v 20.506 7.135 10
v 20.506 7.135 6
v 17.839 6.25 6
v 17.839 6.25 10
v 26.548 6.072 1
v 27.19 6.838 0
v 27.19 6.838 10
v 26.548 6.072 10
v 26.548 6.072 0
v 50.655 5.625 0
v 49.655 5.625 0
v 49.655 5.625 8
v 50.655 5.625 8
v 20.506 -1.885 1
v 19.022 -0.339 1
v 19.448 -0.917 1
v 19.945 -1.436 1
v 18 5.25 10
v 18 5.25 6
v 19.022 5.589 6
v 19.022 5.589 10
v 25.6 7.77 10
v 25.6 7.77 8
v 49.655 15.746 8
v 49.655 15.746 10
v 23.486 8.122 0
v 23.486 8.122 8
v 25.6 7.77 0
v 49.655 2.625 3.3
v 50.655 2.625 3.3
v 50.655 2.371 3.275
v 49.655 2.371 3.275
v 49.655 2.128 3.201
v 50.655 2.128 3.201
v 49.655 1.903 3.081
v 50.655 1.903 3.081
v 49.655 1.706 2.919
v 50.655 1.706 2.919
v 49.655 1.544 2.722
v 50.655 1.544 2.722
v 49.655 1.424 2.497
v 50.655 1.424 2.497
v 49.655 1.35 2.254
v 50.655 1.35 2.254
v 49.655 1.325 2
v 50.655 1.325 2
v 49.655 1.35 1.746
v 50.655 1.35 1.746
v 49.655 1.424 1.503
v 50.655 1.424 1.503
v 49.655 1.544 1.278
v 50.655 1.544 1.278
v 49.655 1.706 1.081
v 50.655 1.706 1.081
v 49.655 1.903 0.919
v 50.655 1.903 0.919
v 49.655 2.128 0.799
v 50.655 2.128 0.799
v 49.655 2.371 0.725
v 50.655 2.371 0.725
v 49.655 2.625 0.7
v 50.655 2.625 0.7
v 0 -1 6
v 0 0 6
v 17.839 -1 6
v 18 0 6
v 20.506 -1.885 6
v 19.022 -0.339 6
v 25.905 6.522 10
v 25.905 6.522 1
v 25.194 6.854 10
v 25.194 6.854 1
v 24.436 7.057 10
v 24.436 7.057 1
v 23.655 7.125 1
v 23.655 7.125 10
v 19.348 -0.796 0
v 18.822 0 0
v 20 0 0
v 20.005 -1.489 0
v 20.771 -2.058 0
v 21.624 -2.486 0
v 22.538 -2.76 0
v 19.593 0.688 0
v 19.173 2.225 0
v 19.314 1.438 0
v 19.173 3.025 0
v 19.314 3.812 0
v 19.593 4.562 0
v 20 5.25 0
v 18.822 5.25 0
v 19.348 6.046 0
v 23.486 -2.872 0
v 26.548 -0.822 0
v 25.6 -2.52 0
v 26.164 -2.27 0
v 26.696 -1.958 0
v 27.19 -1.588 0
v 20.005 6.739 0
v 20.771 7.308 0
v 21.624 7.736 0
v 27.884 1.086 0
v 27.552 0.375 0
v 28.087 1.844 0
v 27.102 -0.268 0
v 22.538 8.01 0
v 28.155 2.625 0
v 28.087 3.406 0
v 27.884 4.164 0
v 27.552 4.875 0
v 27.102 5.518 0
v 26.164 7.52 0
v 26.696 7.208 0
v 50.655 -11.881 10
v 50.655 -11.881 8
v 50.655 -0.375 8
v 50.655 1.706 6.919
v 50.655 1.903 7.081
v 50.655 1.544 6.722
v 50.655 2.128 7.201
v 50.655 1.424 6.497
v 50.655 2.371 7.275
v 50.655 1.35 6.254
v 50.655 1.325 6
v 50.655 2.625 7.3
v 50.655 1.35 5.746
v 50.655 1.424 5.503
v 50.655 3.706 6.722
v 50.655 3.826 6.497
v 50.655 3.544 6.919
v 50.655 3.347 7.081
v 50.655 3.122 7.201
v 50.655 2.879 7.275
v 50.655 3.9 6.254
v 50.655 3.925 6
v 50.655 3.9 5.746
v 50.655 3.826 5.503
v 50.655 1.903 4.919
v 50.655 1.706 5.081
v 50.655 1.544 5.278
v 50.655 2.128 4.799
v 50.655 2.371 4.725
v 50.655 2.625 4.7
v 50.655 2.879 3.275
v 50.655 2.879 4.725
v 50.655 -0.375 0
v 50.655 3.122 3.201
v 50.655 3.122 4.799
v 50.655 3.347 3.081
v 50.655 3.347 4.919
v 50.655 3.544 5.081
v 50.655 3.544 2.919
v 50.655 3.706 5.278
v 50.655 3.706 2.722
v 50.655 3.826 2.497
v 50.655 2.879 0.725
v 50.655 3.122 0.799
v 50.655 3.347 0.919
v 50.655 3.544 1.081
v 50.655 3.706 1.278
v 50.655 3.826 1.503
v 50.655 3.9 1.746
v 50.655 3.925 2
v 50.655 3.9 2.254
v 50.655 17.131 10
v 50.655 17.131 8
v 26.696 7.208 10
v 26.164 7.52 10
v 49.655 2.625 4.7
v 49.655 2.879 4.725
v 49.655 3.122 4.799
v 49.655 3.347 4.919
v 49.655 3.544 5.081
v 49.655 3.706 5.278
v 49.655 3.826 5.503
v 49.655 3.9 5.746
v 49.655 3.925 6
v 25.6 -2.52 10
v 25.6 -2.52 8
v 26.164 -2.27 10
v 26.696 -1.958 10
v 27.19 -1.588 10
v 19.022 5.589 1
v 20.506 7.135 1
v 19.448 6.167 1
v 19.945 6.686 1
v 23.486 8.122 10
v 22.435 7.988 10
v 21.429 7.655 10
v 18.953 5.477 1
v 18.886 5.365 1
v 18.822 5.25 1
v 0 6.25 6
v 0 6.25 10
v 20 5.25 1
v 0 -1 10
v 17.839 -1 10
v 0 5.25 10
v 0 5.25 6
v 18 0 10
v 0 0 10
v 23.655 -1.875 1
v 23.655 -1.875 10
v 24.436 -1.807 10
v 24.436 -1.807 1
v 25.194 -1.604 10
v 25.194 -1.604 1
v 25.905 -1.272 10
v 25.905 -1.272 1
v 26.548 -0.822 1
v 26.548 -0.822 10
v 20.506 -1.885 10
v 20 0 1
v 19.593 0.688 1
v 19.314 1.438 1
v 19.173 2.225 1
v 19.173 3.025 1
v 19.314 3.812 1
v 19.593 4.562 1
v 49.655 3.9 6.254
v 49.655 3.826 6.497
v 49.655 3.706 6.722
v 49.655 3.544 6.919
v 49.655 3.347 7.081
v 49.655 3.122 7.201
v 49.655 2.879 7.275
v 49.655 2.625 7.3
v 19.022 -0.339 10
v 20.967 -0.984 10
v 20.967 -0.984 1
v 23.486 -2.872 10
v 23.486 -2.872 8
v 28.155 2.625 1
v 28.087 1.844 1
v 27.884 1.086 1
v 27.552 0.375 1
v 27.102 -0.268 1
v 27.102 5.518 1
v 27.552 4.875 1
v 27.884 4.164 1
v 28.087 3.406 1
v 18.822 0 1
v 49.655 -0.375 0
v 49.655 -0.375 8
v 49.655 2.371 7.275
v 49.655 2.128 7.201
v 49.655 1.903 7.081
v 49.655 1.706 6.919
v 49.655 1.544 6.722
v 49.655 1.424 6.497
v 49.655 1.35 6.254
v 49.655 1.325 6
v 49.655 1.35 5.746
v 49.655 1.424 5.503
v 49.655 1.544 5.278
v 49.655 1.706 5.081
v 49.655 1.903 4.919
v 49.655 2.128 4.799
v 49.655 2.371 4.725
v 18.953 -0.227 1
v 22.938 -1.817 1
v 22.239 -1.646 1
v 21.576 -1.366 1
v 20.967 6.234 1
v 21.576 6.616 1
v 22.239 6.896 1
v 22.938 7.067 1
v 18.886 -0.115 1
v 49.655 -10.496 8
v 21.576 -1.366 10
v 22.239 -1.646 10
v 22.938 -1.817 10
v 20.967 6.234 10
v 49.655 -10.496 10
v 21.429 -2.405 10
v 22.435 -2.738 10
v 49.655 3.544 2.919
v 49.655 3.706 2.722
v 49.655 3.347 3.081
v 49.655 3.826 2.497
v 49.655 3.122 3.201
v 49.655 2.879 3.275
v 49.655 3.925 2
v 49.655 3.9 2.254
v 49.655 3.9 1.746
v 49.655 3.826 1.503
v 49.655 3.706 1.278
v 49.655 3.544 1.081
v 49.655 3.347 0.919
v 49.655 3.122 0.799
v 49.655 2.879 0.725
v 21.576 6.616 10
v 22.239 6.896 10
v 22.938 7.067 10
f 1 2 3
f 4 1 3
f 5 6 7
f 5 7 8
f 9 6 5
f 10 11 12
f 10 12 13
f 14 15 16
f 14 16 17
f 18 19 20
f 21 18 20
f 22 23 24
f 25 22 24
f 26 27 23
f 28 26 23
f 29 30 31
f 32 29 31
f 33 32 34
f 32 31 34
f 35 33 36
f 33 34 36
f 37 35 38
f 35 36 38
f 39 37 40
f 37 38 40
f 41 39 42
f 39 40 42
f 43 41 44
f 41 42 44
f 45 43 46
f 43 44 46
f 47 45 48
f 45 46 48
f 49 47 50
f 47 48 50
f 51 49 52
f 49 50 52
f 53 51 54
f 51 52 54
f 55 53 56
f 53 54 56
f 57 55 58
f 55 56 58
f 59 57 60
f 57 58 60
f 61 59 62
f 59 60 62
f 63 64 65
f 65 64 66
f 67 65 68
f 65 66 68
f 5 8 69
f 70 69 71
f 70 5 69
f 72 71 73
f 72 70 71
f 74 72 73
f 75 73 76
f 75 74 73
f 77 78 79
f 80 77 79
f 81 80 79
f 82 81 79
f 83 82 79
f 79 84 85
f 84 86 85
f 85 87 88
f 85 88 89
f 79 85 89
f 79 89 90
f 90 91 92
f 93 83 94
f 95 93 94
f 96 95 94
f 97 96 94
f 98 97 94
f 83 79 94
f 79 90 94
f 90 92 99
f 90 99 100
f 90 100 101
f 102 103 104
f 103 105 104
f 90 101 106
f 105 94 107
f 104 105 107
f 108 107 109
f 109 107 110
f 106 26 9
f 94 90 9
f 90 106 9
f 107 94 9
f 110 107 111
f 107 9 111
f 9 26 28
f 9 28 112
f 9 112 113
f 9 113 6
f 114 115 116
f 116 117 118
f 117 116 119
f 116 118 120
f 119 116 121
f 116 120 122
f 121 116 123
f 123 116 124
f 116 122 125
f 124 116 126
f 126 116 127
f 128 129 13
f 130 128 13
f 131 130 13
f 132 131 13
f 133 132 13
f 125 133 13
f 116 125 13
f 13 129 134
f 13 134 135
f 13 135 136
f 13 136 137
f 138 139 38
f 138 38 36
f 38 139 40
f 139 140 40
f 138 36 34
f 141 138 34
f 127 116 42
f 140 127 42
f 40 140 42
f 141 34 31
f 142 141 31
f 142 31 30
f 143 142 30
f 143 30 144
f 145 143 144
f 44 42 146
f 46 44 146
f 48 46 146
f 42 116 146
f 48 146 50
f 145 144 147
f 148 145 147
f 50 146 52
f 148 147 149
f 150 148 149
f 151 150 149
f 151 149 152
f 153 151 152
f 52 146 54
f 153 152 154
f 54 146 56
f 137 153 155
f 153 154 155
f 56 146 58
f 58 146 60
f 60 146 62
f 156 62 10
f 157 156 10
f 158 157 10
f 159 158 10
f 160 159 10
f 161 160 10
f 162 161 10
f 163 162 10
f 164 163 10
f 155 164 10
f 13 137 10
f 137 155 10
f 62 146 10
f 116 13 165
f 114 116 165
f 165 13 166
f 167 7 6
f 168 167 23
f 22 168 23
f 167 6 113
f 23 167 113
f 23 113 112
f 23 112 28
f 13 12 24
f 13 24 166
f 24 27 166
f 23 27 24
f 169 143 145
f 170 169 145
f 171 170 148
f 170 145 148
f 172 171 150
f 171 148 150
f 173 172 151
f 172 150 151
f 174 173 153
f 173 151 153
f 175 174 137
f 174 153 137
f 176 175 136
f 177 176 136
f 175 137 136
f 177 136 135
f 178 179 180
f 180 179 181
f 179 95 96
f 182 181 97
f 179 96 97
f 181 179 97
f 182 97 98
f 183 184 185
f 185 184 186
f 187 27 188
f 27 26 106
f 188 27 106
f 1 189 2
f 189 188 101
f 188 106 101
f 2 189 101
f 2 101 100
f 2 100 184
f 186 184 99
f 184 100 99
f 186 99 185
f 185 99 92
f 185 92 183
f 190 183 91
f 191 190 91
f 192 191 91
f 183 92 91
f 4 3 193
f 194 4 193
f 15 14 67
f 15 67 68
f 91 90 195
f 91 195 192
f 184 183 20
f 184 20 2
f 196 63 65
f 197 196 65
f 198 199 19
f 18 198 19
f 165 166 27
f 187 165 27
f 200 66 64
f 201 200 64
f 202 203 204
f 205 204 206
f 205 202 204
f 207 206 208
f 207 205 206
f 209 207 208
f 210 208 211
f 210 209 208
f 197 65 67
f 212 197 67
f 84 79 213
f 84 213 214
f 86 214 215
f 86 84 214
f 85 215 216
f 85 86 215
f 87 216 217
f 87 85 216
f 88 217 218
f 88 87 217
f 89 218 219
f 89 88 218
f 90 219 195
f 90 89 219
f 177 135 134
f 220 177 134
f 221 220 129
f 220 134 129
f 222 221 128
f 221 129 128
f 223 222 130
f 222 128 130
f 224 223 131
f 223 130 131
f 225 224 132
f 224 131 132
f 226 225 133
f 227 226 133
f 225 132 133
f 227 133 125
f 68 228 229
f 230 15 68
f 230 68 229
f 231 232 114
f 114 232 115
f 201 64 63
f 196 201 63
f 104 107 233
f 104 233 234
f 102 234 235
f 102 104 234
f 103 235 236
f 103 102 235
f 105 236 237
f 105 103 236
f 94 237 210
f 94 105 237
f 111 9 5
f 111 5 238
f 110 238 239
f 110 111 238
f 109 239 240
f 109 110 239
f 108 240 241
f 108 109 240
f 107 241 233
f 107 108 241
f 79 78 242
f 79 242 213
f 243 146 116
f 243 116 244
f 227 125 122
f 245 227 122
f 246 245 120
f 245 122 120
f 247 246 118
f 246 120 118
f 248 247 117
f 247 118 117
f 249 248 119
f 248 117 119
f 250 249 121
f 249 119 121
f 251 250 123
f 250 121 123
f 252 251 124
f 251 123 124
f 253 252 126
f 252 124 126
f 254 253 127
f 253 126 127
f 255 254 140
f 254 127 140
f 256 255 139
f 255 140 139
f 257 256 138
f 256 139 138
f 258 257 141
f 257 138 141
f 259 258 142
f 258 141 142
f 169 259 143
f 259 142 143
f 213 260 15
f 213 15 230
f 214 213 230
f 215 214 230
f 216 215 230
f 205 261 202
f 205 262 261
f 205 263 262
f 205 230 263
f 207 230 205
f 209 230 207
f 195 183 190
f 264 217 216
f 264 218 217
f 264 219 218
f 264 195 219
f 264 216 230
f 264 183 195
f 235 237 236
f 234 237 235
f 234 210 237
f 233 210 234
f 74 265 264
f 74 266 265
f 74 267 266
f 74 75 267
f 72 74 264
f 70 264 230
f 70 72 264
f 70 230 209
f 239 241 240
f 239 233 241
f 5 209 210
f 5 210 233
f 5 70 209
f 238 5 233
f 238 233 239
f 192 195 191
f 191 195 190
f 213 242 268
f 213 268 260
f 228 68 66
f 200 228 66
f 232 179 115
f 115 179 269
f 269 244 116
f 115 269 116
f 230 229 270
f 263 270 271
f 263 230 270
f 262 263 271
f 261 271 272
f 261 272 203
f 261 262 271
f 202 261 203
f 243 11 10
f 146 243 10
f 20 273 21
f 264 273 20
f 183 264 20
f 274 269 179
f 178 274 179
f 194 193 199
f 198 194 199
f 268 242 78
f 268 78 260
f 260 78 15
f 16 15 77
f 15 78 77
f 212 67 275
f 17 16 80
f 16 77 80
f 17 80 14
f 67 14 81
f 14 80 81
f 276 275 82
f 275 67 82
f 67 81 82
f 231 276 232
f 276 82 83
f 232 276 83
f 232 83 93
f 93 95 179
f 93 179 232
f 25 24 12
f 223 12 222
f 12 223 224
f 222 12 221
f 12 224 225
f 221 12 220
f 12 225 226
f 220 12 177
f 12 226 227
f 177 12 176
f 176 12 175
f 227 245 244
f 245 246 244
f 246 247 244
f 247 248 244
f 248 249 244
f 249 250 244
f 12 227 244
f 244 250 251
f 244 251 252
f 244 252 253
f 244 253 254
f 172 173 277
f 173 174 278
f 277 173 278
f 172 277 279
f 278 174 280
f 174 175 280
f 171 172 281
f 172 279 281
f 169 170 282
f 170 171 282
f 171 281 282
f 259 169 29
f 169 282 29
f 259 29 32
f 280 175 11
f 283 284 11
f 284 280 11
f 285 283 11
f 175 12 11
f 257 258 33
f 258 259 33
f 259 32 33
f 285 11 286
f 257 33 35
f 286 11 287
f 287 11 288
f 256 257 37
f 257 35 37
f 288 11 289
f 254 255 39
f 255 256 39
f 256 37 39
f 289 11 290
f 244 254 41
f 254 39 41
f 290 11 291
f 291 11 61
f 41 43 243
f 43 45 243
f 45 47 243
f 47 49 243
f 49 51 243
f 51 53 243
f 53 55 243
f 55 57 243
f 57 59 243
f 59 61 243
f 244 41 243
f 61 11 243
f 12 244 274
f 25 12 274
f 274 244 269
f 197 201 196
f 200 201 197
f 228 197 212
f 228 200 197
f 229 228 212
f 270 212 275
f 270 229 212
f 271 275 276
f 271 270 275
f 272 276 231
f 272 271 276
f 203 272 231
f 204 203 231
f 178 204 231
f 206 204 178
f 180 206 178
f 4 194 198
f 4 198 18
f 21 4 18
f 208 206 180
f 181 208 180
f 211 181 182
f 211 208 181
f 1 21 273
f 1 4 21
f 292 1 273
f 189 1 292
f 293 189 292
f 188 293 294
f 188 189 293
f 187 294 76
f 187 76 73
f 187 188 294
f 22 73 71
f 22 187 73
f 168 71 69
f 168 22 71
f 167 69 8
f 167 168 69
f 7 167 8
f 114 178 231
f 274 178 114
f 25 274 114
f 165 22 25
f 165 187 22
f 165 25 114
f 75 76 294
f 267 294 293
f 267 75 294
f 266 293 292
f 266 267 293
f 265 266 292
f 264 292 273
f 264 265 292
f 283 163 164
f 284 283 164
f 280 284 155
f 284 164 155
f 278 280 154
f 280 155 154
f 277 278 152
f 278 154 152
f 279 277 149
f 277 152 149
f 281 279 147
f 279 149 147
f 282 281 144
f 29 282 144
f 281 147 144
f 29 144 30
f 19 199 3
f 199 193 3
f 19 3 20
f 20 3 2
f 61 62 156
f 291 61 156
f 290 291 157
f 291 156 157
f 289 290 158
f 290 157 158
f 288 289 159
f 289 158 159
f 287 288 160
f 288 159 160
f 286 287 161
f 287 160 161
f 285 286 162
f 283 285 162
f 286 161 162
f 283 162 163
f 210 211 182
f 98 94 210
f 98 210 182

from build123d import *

# Parameters (mm, degrees)
F1_R      = 5.5
F2_DEPTH  = 10
F3_DEPTH  = 10
F5_DEPTH  = 10
F6_DEPTH  = 6
F7_DEPTH  = 10
F8_DEPTH  = 1
F9_DEPTH  = 1
F10_W     = 1
F10_H     = 3
F11_DEPTH = 10
F12_DEPTH = 8
F14_DEPTH = 1


with BuildPart() as f2:
    # F1 (on Top) → F2 (new body)
    with BuildSketch(Plane.XY):
        with Locations((23.6550478793, 2.625)):
            Circle(F1_R)
    extrude(amount=F2_DEPTH)

    # F0 (on Top) → F3 (cut)
    with BuildSketch(Plane.XY):
        with BuildLine():
            ThreePointArc((28.1550478793, 2.625), (27.733432921, 0.7232178222), (26.5475921229, -0.822199994))
            Line((26.5475921229, -0.822199994), (28.8864416499, -3.6095323204))
            Line((28.8864416499, -3.6095323204), (49.6550478793, -10.4956166668))
            Line((49.6550478793, -10.4956166668), (49.6550478793, 2.625))
            Line((49.6550478793, 2.625), (28.1550478793, 2.625))
        make_face()
        with BuildLine():
            Line((28.8864416499, 8.8595323204), (26.5475921229, 6.072199994))
            ThreePointArc((26.5475921229, 6.072199994), (27.733432921, 4.5267821778), (28.1550478793, 2.625))
            Line((28.1550478793, 2.625), (49.6550478793, 2.625))
            Line((49.6550478793, 2.625), (49.6550478793, 15.7456166668))
            Line((49.6550478793, 15.7456166668), (28.8864416499, 8.8595323204))
        make_face()
        with BuildLine():
            Line((23.6550478793, 2.625), (23.6550478793, -1.875))
            ThreePointArc((23.6550478793, -1.875), (25.1941385243, -1.6036167935), (26.5475921229, -0.822199994))
            Line((26.5475921229, -0.822199994), (23.6550478793, 2.625))
        make_face()
        with BuildLine():
            ThreePointArc((20, 5.25), (19.1550478793, 2.625), (20, 0))
            ThreePointArc((20, 0), (20.4453712418, -0.5290411987), (20.9665447643, -0.9835940476))
            Line((20.9665447643, -0.9835940476), (23.6550478793, -1.875))
            Line((23.6550478793, -1.875), (23.6550478793, 2.625))
            Line((23.6550478793, 2.625), (23.6550478793, 7.125))
            Line((23.6550478793, 7.125), (20.9665447643, 6.2335940476))
            ThreePointArc((20.9665447643, 6.2335940476), (20.4453712418, 5.7790411987), (20, 5.25))
        make_face()
        with BuildLine():
            ThreePointArc((26.5475921229, 6.072199994), (25.1941385243, 6.8536167935), (23.6550478793, 7.125))
            Line((23.6550478793, 7.125), (23.6550478793, 2.625))
            Line((23.6550478793, 2.625), (26.5475921229, 6.072199994))
        make_face()
        with BuildLine():
            Line((26.5475921229, 6.072199994), (23.6550478793, 2.625))
            Line((23.6550478793, 2.625), (28.1550478793, 2.625))
            ThreePointArc((28.1550478793, 2.625), (27.733432921, 4.5267821778), (26.5475921229, 6.072199994))
        make_face()
        with BuildLine():
            Line((23.6550478793, 2.625), (26.5475921229, -0.822199994))
            ThreePointArc((26.5475921229, -0.822199994), (27.733432921, 0.7232178222), (28.1550478793, 2.625))
            Line((28.1550478793, 2.625), (23.6550478793, 2.625))
        make_face()
        with BuildLine():
            Line((23.6550478793, -1.875), (20.9665447643, -0.9835940476))
            ThreePointArc((20.9665447643, -0.9835940476), (22.2388334206, -1.6463389712), (23.6550478793, -1.875))
        make_face()
        with BuildLine():
            ThreePointArc((23.6550478793, 7.125), (22.2388334206, 6.8963389712), (20.9665447643, 6.2335940476))
            Line((20.9665447643, 6.2335940476), (23.6550478793, 7.125))
        make_face()
    extrude(amount=F3_DEPTH, mode=Mode.SUBTRACT)

    # F4 (on Top) → F5 (join)
    with BuildSketch(Plane.XY):
        Polygon((0, 5.25), (18, 5.25), (19.0219422369, 5.5888373954), (20.506438149, 7.1345739007), (17.8385406763, 6.25), (0, 6.25), align=None)
        Polygon((19.0219422369, -0.3388373954), (18, 0), (0, 0), (0, -1), (17.8385406763, -1), (20.506438149, -1.8845739007), align=None)
    extrude(amount=F5_DEPTH)

    # F4 (on Top) → F6 (cut)
    with BuildSketch(Plane.XY):
        Polygon((0, 5.25), (18, 5.25), (19.0219422369, 5.5888373954), (20.506438149, 7.1345739007), (17.8385406763, 6.25), (0, 6.25), align=None)
        Polygon((19.0219422369, -0.3388373954), (18, 0), (0, 0), (0, -1), (17.8385406763, -1), (20.506438149, -1.8845739007), align=None)
    extrude(amount=F6_DEPTH, mode=Mode.SUBTRACT)

    # F0 (on Top) → F7 (cut)
    with BuildSketch(Plane.XY):
        with BuildLine():
            Line((0, 5.25), (0, 0))
            Line((0, 0), (18, 0))
            Line((18, 0), (20, 0))
            ThreePointArc((20, 0), (19.1550478793, 2.625), (20, 5.25))
            Line((20, 5.25), (18, 5.25))
            Line((18, 5.25), (0, 5.25))
        make_face()
        with BuildLine():
            Line((20, 0), (18, 0))
            Line((18, 0), (20.9665447643, -0.9835940476))
            ThreePointArc((20.9665447643, -0.9835940476), (20.4453712418, -0.5290411987), (20, 0))
        make_face()
        with BuildLine():
            Line((20.9665447643, 6.2335940476), (18, 5.25))
            Line((18, 5.25), (20, 5.25))
            ThreePointArc((20, 5.25), (20.4453712418, 5.7790411987), (20.9665447643, 6.2335940476))
        make_face()
    extrude(amount=F7_DEPTH, mode=Mode.SUBTRACT)

    # F1 (on Top) → F8 (join)
    with BuildSketch(Plane.XY):
        with Locations((23.6550478793, 2.625)):
            Circle(F1_R)
    extrude(amount=F8_DEPTH)

    # F0 (on Top) → F9 (cut)
    with BuildSketch(Plane.XY):
        with BuildLine():
            Line((0, 5.25), (0, 0))
            Line((0, 0), (18, 0))
            Line((18, 0), (20, 0))
            ThreePointArc((20, 0), (19.1550478793, 2.625), (20, 5.25))
            Line((20, 5.25), (18, 5.25))
            Line((18, 5.25), (0, 5.25))
        make_face()
        with BuildLine():
            ThreePointArc((28.1550478793, 2.625), (27.733432921, 0.7232178222), (26.5475921229, -0.822199994))
            Line((26.5475921229, -0.822199994), (28.8864416499, -3.6095323204))
            Line((28.8864416499, -3.6095323204), (49.6550478793, -10.4956166668))
            Line((49.6550478793, -10.4956166668), (49.6550478793, 2.625))
            Line((49.6550478793, 2.625), (28.1550478793, 2.625))
        make_face()
        with BuildLine():
            Line((28.8864416499, 8.8595323204), (26.5475921229, 6.072199994))
            ThreePointArc((26.5475921229, 6.072199994), (27.733432921, 4.5267821778), (28.1550478793, 2.625))
            Line((28.1550478793, 2.625), (49.6550478793, 2.625))
            Line((49.6550478793, 2.625), (49.6550478793, 15.7456166668))
            Line((49.6550478793, 15.7456166668), (28.8864416499, 8.8595323204))
        make_face()
    extrude(amount=F9_DEPTH, mode=Mode.SUBTRACT)

    # F10 (on Top) → F11 (join)
    with BuildSketch(Plane.XY):
        Polygon((23.4857258463, 8.122393023), (25.5996504067, 7.7697566522), (49.6550478793, 15.7456166668), (49.6550478793, 5.625), (50.6550478793, 5.625), (50.6550478793, 17.1307126516), align=None)
        Polygon((50.6550478793, -0.375), (49.6550478793, -0.375), (49.6550478793, -10.4956166668), (25.5996504067, -2.5197566522), (23.4857258463, -2.872393023), (50.6550478793, -11.8807126516), align=None)
        with Locations((50.1550478793, 1.125)):
            Rectangle(F10_W, F10_H)
        with Locations((50.1550478793, 4.125)):
            Rectangle(F10_W, F10_H)
    extrude(amount=F11_DEPTH)

    # F10 (on Top) → F12 (cut)
    with BuildSketch(Plane.XY):
        Polygon((23.4857258463, 8.122393023), (25.5996504067, 7.7697566522), (49.6550478793, 15.7456166668), (49.6550478793, 5.625), (50.6550478793, 5.625), (50.6550478793, 17.1307126516), align=None)
        Polygon((50.6550478793, -0.375), (49.6550478793, -0.375), (49.6550478793, -10.4956166668), (25.5996504067, -2.5197566522), (23.4857258463, -2.872393023), (50.6550478793, -11.8807126516), align=None)
    extrude(amount=F12_DEPTH, mode=Mode.SUBTRACT)

    # F13 (on face) → F14 (cut)
    with BuildSketch(Plane.YZ.offset(50.6550478793)):
        with BuildLine():
            ThreePointArc((2.625, 4.7), (3.5442388155, 5.0807611845), (3.925, 6))
            ThreePointArc((3.925, 6), (3.5442388155, 6.9192388155), (2.625, 7.3))
            Line((2.625, 7.3), (2.625, 4.7))
        make_face()
        with BuildLine():
            ThreePointArc((3.925, 2), (3.5442388155, 2.9192388155), (2.625, 3.3))
            Line((2.625, 3.3), (2.625, 0.7))
            ThreePointArc((2.625, 0.7), (3.5442388155, 1.0807611845), (3.925, 2))
        make_face()
        with BuildLine():
            Line((2.625, 0.7), (2.625, 3.3))
            ThreePointArc((2.625, 3.3), (1.325, 2), (2.625, 0.7))
        make_face()
        with BuildLine():
            Line((2.625, 4.7), (2.625, 7.3))
            ThreePointArc((2.625, 7.3), (1.325, 6), (2.625, 4.7))
        make_face()
    extrude(amount=-F14_DEPTH, mode=Mode.SUBTRACT)


solid = f2.part
